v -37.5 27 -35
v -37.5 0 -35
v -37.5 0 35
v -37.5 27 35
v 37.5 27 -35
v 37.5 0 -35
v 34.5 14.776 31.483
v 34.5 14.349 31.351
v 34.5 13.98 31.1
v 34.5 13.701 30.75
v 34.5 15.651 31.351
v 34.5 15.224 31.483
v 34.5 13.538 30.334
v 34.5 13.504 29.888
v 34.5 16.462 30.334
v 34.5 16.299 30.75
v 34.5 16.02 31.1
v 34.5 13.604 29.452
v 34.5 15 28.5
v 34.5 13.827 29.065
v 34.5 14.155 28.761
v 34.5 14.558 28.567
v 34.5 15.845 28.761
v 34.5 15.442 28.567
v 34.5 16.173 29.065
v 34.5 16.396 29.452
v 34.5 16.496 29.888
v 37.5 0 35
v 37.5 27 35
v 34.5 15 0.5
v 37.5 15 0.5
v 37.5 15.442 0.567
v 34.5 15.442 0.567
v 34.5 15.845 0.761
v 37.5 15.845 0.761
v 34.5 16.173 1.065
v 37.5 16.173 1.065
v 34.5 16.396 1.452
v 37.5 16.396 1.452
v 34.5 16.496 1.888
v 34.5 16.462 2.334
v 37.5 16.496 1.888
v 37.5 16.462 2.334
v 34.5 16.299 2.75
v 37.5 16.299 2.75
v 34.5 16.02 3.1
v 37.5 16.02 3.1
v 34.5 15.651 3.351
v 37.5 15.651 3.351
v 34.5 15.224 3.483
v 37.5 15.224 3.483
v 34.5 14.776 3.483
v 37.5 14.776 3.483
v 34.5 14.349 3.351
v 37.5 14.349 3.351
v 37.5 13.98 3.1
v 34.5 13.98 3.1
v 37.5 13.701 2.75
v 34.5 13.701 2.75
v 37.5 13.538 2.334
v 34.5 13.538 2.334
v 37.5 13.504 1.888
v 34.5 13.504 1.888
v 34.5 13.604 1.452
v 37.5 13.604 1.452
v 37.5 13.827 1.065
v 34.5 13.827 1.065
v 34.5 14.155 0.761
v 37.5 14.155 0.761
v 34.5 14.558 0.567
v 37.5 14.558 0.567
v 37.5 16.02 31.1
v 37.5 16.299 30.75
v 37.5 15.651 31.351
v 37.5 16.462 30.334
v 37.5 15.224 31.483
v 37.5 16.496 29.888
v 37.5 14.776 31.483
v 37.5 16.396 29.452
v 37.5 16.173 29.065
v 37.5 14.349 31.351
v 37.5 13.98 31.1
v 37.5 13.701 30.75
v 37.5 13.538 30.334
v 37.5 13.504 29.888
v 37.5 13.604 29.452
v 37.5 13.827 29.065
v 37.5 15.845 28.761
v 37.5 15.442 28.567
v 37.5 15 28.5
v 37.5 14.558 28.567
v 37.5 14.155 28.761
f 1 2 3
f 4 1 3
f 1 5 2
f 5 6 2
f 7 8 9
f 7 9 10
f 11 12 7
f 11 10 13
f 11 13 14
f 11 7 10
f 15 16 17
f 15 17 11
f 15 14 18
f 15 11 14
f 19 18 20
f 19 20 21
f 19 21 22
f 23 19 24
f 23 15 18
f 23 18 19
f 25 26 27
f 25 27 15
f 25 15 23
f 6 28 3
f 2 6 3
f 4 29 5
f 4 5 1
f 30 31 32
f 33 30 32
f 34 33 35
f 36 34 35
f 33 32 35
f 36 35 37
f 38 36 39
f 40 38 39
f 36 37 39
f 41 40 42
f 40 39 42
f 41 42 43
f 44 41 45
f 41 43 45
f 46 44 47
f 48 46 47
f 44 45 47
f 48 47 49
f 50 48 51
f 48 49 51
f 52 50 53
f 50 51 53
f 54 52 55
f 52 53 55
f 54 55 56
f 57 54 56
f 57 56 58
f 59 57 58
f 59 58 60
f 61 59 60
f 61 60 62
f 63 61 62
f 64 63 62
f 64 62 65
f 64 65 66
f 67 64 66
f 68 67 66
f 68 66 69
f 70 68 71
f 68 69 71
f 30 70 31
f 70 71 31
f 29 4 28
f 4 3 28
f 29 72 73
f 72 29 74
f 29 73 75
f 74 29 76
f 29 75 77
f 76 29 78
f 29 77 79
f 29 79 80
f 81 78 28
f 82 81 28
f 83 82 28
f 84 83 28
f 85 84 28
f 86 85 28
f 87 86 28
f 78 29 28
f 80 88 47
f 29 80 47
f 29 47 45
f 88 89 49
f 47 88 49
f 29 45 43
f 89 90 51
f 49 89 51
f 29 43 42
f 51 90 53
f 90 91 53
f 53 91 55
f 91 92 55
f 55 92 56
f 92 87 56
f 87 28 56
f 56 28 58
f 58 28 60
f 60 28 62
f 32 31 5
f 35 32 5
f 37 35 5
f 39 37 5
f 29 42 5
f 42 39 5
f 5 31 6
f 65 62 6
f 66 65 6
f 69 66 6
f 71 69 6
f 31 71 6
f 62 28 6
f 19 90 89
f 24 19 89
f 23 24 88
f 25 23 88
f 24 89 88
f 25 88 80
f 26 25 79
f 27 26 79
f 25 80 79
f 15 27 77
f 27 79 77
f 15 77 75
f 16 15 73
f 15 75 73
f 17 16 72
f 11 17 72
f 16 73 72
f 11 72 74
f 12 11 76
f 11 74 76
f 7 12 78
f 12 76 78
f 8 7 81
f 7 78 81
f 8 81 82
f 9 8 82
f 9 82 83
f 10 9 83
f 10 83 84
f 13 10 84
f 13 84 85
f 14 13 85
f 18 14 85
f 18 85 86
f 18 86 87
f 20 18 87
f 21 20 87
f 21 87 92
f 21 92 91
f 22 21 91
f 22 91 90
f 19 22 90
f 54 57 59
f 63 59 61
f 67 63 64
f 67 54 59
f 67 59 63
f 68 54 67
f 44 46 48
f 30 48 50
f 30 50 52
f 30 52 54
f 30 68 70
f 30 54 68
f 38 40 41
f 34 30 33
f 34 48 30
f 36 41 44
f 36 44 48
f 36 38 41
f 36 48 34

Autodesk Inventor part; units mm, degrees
ref_plane "YZ Plane" through (0, 0, 0) normal (1, 0, 0) x (0, 1, 0)
ref_plane "XZ Plane" through (0, 0, 0) normal (0, 1, 0) x (-1, 0, 0)
ref_plane "XY Plane" through (0, 0, 0) normal (0, 0, 1) x (1, 0, 0)
sketch "Sketch1" plane through (0, 0, 0) normal (0, 1, 0) x (-1, 0, 0)
  line L0 (37.5, 35) -> (-37.5, 35)
  line L1 (-37.5, 35) -> (-37.5, -35)
  line L2 (-37.5, -35) -> (37.5, -35)
  line L3 (37.5, -35) -> (37.5, 35)
  point P0 (0, 0)
  point P1 (37.5, 0)
  point P2 (0, -35)
  dimension "d1" = 75
  dimension "d2" = 70
extrude "Extrusion1" add sketch "Sketch1" along normal blind 27
sketch "Sketch2" plane through (37.5, 0, 35) normal (1, 0, 0) x (0, 0, -1)
  circle A0 centre (5, 15) radius 1.5
  line L0 (0, 27) -> (70, 27) projected
  line L1 (0, 0) -> (0, 27) projected
  circle A1 centre (33, 15) radius 1.5
  point P0 (35, 0)
  dimension "d5" = 3
  dimension "d6" = 12
  dimension "d7" = 5
  dimension "d8" = 3
  dimension "d9" = 28
extrude "Extrusion2" cut sketch "Sketch2" against normal blind 3
equation "\"d8\" = d5"
properties part number "power_supply"
